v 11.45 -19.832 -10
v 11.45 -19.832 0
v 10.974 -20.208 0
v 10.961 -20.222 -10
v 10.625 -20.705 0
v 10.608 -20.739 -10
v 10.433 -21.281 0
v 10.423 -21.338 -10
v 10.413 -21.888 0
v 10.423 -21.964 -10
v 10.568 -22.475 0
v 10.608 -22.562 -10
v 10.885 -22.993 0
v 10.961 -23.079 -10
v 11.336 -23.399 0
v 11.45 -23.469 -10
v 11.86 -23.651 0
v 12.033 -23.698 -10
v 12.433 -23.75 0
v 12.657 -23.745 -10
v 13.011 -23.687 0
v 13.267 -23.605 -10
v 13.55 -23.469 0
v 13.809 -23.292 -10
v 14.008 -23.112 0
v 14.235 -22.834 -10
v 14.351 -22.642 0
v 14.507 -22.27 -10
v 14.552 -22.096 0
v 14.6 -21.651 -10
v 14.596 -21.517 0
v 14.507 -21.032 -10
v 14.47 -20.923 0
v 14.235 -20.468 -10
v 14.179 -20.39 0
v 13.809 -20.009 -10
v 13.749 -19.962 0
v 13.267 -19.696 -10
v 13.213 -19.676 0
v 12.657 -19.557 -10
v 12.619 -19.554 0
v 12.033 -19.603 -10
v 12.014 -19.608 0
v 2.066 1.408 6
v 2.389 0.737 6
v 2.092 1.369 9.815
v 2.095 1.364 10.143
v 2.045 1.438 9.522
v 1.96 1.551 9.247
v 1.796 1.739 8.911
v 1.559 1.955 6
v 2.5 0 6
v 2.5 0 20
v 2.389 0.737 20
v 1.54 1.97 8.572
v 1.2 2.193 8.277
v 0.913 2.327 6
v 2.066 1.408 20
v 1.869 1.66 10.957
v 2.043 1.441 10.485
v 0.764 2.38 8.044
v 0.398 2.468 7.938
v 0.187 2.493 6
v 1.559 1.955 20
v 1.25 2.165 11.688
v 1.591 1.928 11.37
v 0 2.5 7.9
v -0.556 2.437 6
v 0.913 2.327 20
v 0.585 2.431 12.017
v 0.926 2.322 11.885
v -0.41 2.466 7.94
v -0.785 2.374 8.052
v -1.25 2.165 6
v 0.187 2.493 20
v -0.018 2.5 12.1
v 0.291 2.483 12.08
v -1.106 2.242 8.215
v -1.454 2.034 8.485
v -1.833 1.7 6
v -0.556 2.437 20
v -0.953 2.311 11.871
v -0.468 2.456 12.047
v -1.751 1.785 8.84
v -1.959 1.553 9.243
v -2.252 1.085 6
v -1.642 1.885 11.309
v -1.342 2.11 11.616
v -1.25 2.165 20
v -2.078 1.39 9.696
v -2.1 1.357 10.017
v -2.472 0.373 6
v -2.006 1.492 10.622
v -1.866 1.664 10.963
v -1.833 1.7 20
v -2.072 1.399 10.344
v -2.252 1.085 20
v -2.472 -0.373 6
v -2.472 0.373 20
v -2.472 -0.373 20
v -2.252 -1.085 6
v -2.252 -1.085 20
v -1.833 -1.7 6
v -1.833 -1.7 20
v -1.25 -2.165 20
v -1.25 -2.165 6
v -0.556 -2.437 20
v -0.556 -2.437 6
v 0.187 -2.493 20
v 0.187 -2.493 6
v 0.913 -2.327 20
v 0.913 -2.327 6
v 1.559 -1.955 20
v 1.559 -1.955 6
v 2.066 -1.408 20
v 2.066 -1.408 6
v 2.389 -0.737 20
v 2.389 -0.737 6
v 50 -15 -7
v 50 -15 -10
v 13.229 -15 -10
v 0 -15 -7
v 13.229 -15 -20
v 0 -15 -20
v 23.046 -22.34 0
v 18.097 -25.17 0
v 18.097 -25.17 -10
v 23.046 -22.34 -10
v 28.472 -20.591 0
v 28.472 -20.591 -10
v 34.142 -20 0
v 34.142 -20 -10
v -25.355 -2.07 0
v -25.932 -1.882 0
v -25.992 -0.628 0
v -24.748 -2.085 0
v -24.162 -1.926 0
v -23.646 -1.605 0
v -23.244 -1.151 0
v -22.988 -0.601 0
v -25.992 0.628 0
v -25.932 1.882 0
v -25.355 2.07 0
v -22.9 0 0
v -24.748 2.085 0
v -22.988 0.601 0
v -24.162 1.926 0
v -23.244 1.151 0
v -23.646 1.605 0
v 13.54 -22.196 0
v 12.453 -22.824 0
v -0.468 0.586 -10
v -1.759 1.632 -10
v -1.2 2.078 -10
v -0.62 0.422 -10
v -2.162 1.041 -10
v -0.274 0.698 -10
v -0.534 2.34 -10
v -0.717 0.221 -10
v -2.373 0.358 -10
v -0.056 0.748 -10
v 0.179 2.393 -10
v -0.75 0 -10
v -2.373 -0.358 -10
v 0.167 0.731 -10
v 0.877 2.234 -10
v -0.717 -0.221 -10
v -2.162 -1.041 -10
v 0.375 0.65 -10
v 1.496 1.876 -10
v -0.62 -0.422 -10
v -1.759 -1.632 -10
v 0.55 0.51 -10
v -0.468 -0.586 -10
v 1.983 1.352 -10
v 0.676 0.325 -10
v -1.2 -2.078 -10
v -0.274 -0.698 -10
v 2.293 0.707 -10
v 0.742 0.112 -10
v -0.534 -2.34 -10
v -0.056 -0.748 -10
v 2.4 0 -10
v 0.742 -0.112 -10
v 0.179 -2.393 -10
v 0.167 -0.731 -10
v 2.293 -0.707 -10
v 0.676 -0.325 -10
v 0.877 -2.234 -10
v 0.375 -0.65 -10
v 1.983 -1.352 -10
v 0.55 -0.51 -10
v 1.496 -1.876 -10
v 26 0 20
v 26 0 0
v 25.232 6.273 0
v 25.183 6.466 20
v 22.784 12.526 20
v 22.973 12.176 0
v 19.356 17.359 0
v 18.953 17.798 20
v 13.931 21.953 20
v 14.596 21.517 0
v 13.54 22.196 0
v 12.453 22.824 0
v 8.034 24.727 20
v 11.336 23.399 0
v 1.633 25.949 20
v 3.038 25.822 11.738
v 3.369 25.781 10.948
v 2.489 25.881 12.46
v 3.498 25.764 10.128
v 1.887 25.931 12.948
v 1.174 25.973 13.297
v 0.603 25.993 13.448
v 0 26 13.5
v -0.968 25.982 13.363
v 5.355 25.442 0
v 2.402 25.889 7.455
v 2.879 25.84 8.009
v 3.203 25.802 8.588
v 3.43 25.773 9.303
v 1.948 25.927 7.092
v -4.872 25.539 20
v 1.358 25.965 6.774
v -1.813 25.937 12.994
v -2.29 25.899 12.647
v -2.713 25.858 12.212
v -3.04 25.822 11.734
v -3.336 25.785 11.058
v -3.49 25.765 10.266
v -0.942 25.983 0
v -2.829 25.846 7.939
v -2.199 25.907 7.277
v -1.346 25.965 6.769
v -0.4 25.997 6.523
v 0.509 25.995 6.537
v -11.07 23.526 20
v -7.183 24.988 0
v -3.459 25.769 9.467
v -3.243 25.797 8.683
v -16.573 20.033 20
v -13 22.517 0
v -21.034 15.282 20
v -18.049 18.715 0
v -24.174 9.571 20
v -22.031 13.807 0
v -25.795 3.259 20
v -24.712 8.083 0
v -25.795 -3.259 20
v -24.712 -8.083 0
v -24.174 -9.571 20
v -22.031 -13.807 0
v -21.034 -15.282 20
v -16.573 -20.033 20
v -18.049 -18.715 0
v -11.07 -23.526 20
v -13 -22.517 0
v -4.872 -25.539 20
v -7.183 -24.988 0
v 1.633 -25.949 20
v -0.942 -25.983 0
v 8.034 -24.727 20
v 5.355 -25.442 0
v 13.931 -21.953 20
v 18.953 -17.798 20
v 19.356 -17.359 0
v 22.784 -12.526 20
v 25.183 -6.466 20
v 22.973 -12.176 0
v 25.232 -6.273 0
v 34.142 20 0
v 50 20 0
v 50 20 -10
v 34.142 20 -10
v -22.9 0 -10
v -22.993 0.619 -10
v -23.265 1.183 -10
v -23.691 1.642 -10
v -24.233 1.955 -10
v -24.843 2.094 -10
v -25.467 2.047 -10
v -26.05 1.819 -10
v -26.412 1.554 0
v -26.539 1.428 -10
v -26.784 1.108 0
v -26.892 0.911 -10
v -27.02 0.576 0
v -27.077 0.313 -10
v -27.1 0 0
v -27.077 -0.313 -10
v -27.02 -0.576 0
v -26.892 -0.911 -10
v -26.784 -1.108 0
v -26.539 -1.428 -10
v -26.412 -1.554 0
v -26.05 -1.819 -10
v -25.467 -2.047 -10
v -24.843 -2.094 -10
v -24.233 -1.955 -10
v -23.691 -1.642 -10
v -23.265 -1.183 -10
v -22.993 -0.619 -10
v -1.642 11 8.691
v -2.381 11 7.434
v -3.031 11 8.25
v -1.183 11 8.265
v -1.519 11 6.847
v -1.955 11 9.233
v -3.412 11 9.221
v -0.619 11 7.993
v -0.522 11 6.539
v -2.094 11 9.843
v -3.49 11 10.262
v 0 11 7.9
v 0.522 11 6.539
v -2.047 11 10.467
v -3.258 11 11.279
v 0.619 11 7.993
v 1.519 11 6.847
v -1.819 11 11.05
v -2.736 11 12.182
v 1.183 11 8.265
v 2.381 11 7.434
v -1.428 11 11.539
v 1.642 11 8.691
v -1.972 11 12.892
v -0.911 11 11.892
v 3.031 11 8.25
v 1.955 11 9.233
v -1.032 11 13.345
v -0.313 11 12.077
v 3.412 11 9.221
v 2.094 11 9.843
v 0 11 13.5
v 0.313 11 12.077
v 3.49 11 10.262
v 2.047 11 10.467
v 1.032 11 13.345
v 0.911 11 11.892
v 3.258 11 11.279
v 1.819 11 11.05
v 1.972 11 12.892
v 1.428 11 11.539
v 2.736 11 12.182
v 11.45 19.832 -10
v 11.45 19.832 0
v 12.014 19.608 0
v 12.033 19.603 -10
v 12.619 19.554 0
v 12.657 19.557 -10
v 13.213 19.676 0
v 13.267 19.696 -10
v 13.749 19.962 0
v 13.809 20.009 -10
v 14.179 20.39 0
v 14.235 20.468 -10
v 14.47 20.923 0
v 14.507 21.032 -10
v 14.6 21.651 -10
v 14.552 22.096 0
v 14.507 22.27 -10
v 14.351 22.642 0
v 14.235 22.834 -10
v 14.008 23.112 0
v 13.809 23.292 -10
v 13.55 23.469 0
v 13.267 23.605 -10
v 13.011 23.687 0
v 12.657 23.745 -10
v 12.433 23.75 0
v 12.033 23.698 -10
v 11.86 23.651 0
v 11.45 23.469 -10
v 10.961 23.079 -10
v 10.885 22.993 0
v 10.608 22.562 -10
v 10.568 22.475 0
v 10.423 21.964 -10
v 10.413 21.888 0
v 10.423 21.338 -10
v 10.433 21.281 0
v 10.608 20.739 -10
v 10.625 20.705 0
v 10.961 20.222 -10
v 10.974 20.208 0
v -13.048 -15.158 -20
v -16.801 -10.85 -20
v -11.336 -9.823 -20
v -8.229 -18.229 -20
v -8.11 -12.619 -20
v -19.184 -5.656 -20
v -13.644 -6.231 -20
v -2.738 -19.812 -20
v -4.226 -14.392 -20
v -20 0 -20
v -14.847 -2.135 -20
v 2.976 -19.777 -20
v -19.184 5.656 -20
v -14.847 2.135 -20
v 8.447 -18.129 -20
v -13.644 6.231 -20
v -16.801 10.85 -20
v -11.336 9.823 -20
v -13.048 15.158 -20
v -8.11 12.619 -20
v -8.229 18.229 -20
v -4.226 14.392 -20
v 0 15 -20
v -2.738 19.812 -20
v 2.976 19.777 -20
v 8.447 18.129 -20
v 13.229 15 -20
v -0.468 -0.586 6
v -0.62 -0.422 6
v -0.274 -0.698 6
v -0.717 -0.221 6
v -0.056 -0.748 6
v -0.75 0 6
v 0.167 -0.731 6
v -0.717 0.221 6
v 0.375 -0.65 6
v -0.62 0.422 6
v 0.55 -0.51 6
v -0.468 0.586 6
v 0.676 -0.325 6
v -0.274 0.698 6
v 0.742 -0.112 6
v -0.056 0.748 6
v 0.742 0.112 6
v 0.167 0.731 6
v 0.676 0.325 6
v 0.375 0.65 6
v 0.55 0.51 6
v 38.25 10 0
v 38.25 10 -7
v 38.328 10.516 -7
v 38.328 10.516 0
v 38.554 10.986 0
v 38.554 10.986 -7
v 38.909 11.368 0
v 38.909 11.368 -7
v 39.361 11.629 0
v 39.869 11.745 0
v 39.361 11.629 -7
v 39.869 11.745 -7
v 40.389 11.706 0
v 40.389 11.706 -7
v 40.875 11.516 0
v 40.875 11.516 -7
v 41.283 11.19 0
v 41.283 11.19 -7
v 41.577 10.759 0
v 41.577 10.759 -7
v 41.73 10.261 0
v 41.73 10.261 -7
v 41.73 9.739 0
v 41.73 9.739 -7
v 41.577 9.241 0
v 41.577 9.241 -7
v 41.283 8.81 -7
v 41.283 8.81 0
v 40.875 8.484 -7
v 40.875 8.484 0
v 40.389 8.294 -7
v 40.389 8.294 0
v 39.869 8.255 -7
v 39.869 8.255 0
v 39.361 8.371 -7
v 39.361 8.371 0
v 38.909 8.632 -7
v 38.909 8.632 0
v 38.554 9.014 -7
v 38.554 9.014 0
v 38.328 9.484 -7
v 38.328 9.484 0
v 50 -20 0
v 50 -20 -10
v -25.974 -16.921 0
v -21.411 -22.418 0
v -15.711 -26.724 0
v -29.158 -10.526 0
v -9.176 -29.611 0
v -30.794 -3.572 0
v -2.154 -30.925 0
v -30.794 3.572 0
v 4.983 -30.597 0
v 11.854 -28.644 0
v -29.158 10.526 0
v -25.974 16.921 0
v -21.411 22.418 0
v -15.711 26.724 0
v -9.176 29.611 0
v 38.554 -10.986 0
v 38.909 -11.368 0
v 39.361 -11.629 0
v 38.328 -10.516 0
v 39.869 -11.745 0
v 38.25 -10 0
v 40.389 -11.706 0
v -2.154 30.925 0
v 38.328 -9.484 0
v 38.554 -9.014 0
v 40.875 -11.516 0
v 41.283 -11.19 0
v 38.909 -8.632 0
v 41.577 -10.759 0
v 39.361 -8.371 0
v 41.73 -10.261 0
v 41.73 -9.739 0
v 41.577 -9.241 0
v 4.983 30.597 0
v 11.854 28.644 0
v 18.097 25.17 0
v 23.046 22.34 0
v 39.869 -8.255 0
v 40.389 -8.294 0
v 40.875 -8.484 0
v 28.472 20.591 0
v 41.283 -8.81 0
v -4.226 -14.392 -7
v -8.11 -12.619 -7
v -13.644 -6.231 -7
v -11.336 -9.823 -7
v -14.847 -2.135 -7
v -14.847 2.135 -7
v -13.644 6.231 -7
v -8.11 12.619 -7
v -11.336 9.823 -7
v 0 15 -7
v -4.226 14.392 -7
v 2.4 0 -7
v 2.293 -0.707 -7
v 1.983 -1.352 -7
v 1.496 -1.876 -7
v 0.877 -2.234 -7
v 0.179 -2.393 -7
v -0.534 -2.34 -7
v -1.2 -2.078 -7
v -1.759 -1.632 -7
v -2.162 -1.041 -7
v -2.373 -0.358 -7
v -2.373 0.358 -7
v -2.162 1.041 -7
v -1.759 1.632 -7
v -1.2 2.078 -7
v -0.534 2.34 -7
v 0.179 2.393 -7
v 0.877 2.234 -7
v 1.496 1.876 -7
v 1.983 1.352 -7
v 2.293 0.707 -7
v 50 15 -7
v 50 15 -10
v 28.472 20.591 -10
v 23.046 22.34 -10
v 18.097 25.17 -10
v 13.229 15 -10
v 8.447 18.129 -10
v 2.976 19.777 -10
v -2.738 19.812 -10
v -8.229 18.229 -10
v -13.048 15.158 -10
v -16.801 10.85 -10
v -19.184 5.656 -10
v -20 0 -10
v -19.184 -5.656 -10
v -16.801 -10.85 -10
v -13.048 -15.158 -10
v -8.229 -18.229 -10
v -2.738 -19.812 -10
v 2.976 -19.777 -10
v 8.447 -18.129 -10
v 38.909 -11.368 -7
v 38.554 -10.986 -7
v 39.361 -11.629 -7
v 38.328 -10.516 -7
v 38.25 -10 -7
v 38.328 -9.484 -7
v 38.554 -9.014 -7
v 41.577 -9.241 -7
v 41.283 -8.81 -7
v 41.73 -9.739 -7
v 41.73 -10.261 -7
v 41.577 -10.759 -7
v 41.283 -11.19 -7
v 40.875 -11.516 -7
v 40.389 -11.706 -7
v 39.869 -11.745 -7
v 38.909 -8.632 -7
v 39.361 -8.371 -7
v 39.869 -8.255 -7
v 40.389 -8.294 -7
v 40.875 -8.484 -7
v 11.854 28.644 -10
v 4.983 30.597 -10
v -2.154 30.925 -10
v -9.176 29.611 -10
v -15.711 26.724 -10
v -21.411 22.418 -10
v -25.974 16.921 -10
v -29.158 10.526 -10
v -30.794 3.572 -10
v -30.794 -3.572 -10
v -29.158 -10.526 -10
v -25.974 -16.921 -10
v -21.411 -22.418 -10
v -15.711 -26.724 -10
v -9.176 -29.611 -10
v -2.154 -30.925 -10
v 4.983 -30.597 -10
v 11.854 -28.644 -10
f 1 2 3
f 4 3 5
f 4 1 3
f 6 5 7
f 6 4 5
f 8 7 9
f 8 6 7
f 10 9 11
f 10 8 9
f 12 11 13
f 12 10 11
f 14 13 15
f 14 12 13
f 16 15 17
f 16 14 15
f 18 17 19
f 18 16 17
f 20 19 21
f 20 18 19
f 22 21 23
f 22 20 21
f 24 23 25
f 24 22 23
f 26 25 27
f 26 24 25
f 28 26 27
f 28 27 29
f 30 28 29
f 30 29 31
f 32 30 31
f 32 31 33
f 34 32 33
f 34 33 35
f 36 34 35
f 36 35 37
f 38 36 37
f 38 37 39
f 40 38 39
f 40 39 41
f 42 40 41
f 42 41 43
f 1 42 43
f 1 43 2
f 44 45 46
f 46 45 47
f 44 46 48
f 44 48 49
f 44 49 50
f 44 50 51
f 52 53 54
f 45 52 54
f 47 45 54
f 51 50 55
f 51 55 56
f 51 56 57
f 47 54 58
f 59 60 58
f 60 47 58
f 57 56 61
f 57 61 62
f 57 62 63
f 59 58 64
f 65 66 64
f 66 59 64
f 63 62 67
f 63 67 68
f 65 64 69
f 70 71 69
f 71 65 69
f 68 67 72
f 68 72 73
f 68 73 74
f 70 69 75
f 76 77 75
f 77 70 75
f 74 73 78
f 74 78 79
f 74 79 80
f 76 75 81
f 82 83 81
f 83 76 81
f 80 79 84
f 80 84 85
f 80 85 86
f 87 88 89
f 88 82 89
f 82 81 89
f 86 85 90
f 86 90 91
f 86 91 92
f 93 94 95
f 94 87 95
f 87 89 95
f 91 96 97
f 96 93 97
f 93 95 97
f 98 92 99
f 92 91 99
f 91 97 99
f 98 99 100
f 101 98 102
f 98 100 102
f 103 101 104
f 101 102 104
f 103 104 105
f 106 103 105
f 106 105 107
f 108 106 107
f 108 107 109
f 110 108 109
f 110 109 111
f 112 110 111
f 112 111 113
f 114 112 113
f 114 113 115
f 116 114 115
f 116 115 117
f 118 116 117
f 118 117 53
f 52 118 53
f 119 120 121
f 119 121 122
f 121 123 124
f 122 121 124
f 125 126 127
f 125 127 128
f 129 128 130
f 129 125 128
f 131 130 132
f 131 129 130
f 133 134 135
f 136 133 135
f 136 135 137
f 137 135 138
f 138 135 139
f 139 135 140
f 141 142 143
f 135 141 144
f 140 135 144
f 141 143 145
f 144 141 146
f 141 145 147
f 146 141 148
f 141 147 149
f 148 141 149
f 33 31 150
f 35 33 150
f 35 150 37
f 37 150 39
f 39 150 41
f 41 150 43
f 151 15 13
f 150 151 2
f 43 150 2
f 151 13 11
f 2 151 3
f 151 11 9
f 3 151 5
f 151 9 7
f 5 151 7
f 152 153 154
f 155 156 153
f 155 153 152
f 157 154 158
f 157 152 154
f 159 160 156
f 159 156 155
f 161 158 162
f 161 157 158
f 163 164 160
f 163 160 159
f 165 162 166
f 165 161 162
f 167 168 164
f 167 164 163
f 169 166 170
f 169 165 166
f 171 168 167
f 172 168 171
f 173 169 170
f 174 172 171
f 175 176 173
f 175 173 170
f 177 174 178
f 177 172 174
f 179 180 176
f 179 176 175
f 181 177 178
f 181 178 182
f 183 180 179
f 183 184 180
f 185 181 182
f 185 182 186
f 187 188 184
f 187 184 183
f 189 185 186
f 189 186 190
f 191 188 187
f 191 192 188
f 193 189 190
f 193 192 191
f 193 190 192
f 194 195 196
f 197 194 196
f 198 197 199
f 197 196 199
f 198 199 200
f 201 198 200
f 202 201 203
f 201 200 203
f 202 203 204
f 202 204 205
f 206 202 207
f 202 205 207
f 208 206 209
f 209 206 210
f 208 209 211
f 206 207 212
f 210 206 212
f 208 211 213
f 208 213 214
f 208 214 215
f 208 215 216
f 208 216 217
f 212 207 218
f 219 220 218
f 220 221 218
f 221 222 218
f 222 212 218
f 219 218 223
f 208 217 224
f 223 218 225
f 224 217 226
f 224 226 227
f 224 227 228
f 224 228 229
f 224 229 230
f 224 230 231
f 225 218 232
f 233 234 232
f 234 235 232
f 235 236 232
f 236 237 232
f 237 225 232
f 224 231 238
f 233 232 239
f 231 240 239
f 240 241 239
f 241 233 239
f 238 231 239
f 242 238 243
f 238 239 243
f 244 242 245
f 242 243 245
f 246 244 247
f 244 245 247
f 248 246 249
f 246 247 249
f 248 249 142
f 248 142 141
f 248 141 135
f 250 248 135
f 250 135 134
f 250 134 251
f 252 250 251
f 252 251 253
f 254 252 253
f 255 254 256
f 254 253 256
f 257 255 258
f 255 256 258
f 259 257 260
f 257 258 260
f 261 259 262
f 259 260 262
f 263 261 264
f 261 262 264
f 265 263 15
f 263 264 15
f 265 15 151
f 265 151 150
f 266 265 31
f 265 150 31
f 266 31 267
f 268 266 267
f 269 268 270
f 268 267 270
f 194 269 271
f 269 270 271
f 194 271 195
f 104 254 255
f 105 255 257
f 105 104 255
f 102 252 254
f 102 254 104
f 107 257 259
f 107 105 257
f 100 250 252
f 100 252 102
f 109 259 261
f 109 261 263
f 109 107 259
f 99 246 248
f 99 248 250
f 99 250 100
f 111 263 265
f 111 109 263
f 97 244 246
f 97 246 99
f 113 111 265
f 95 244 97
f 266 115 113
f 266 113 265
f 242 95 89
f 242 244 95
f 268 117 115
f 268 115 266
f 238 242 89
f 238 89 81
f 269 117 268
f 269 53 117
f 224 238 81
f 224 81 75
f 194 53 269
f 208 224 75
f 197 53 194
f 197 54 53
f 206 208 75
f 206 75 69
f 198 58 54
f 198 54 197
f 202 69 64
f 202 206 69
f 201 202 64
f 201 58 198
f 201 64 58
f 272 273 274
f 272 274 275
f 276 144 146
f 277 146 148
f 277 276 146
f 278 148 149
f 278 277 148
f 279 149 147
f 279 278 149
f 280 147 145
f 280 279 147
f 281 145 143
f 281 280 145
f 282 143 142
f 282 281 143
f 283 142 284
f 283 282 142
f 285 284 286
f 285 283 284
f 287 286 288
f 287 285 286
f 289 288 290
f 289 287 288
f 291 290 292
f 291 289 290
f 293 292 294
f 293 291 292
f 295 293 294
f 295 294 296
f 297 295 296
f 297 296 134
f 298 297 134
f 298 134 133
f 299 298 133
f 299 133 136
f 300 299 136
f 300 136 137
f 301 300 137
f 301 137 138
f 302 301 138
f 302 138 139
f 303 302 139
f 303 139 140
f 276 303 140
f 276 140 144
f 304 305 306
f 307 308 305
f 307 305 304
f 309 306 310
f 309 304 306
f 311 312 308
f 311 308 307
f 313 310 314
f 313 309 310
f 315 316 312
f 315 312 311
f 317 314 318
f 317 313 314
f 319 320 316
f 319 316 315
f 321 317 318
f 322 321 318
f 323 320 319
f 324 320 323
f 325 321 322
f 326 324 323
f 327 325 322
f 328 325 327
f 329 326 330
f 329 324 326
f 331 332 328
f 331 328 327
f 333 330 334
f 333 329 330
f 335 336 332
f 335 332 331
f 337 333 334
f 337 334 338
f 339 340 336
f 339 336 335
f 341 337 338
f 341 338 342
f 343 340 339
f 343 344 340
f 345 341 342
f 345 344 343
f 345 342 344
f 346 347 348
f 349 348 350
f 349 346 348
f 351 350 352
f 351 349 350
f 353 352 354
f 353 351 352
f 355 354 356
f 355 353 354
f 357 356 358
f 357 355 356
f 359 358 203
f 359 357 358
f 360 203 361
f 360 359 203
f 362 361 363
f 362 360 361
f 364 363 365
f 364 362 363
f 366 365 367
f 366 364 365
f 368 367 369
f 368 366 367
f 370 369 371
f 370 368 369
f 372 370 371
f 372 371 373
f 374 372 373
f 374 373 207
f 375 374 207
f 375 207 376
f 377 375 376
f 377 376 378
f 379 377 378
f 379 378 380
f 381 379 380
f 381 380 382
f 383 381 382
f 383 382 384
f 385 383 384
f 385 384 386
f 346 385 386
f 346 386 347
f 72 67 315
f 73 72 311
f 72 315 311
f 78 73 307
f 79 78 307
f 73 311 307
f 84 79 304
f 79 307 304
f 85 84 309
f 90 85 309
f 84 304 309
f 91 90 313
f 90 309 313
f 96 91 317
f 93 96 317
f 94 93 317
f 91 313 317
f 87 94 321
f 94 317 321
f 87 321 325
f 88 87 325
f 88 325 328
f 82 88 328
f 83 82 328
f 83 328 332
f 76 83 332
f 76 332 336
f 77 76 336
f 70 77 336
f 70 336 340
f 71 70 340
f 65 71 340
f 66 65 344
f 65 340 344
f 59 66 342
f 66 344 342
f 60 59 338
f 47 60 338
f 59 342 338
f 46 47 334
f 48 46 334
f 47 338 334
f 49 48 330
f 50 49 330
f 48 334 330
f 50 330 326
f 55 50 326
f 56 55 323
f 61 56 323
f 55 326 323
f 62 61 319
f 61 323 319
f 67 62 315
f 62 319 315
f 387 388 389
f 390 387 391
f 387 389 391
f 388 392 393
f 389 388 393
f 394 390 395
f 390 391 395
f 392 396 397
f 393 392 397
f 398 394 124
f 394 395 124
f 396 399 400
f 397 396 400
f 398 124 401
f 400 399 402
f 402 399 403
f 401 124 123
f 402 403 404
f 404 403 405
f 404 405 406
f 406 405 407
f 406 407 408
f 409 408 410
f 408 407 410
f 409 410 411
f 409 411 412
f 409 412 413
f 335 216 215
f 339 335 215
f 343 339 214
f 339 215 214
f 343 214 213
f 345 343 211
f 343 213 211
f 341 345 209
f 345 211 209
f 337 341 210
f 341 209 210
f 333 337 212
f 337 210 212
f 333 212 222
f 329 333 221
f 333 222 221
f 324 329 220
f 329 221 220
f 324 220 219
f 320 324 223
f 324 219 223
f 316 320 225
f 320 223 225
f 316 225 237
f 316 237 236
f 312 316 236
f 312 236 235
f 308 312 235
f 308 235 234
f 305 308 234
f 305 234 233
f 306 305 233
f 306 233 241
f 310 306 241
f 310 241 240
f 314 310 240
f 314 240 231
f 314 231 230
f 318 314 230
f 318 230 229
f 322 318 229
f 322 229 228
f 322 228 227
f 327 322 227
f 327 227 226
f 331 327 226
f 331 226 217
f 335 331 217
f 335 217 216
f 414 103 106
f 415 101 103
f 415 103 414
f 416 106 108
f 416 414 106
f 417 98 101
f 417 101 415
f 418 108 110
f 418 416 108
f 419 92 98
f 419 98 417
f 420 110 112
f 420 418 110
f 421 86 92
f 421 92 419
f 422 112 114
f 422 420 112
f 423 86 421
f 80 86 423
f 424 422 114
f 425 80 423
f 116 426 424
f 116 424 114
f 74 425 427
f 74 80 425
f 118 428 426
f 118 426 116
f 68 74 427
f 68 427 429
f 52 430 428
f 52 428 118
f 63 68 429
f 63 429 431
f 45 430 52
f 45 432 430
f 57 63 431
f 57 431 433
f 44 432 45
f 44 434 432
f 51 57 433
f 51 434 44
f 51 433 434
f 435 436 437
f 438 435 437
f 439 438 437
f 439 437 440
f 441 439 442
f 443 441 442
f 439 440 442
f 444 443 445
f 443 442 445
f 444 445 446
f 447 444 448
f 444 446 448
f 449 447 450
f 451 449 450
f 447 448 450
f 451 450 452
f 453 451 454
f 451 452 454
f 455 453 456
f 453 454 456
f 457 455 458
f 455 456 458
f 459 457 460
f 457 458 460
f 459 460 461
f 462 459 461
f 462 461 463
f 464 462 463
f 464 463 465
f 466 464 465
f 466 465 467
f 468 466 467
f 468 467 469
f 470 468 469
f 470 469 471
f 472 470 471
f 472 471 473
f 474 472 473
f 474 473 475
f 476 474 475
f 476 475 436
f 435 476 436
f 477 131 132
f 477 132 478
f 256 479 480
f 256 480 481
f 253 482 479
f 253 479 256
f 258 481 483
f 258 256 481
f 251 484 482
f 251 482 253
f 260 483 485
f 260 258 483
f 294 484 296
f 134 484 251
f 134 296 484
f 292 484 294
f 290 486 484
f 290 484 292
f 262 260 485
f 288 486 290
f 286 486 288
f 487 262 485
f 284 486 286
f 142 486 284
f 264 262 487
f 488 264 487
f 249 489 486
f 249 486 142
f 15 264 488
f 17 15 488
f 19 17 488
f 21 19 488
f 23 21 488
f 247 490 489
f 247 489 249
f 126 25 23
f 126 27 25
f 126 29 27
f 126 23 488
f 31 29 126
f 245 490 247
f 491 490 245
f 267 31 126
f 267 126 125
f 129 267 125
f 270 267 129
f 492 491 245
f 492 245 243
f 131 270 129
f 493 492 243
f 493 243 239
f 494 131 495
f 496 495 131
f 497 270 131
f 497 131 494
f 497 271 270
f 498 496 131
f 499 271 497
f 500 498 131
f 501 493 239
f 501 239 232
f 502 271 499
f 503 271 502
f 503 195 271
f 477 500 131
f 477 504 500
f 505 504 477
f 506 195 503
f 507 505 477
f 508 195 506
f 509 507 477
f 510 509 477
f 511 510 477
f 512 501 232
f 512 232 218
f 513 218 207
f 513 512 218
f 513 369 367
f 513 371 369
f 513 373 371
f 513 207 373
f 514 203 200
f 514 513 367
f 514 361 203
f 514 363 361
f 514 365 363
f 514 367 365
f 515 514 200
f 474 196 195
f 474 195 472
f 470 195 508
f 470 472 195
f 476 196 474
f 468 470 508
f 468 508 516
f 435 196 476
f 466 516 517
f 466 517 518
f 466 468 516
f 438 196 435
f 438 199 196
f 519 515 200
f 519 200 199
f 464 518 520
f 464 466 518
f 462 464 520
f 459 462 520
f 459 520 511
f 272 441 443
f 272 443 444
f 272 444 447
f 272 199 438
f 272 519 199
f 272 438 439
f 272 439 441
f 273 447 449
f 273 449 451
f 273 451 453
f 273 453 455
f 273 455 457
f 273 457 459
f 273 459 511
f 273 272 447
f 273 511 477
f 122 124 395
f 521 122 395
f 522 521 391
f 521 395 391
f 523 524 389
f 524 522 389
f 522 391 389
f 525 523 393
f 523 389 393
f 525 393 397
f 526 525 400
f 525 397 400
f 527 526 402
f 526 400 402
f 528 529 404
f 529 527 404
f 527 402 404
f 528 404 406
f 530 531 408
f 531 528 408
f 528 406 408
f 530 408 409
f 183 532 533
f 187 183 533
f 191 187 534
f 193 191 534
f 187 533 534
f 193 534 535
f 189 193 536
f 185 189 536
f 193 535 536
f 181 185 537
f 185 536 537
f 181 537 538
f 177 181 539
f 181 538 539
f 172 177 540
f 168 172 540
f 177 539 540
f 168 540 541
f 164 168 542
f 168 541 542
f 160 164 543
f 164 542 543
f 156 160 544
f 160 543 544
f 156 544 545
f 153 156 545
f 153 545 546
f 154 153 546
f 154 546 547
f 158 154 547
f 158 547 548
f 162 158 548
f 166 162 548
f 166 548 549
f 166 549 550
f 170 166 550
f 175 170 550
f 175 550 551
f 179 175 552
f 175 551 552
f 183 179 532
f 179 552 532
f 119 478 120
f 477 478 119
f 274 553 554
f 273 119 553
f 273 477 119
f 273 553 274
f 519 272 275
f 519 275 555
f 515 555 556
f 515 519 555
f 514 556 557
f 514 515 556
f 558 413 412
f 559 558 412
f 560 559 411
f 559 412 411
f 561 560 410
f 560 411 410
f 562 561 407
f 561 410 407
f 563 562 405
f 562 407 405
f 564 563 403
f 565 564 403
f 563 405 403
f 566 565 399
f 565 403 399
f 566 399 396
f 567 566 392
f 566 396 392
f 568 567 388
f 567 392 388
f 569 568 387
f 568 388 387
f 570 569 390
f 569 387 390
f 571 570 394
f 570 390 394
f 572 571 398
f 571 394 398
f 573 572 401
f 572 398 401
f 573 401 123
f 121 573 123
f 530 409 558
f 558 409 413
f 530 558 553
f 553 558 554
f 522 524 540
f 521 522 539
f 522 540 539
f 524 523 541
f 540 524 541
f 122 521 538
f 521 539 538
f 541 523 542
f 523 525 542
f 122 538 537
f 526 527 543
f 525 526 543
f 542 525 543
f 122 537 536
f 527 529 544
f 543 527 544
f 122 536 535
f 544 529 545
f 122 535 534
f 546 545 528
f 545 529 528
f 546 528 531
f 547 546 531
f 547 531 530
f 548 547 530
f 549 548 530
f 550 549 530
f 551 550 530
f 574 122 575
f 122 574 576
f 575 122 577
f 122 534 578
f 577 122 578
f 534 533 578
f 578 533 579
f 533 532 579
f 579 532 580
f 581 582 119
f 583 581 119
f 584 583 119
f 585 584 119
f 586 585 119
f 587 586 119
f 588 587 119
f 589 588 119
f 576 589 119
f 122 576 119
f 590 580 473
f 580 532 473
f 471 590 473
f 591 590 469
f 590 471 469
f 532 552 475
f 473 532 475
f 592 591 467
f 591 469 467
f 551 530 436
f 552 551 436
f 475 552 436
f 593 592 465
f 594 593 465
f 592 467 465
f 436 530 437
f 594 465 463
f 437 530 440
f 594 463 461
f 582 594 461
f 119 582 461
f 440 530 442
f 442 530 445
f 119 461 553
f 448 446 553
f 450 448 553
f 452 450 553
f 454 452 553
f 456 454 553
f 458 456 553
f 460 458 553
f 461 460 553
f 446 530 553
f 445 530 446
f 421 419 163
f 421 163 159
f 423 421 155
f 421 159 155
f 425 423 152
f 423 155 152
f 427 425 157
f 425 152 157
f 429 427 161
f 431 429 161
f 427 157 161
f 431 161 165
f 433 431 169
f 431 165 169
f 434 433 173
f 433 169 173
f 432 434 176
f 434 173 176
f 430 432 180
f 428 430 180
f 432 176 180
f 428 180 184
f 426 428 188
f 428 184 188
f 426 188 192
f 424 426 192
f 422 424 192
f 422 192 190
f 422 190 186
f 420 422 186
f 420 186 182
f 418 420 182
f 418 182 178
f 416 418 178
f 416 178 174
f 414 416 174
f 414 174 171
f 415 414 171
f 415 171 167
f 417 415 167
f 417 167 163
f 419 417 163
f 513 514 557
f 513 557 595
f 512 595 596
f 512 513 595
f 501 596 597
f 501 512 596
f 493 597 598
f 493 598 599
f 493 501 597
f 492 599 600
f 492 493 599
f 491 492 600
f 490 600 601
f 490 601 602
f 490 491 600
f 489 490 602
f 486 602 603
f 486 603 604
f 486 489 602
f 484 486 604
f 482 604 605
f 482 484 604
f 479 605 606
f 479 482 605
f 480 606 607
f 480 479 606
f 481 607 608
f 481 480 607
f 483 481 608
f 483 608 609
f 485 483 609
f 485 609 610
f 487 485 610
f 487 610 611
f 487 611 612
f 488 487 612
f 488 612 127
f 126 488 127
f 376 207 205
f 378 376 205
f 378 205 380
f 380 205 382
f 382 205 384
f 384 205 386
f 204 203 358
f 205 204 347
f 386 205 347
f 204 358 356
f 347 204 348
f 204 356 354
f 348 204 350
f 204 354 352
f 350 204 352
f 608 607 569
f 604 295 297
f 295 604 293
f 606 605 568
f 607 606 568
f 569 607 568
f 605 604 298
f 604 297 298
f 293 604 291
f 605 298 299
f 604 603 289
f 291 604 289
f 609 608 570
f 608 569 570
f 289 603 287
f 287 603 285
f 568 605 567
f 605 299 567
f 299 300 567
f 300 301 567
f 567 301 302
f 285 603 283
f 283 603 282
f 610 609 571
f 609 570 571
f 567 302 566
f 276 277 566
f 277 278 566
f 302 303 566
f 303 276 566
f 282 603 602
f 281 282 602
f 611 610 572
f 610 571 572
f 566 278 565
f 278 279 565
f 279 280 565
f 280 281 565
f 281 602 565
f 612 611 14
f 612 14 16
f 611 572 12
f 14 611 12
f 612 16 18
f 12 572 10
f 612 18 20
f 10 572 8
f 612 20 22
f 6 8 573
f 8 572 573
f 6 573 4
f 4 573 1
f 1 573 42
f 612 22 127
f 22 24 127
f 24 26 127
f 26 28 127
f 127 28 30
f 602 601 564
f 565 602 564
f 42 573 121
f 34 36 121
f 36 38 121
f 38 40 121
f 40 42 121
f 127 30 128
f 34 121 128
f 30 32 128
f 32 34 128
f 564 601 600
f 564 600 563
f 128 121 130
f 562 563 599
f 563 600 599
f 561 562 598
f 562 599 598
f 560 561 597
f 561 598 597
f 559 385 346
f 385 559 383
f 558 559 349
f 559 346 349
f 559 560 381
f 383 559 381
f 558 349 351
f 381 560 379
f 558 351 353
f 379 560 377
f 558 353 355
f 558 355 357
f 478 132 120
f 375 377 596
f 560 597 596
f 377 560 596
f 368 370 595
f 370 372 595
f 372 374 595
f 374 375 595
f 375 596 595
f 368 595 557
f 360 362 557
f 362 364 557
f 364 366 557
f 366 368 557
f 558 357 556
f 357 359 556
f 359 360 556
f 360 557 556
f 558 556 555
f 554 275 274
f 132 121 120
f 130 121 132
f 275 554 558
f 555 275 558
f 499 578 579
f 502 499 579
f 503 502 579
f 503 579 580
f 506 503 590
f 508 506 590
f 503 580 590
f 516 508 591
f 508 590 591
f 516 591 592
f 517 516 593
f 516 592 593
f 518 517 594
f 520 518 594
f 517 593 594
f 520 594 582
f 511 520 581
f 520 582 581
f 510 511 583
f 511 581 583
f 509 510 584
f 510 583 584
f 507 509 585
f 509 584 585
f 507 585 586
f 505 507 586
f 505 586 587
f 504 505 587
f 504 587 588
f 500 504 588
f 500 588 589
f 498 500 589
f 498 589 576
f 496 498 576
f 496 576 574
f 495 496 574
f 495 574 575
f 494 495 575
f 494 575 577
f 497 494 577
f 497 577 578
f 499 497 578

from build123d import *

# Parameters (mm, degrees)
SKETCH1_R                     = 26
BOSS_EXTRUDE1_DEPTH           = 20
SKETCH2_W                     = 2.1
SKETCH2_H                     = 26
SKETCH4_R                     = 3.5
CUT_EXTRUDE1_DEPTH            = 15
BOSS_EXTRUDE2_DEPTH           = 10
CUT_EXTRUDE2_DEPTH            = 3
SKETCH7_R                     = 2.4
BOSS_EXTRUDE3_DEPTH           = 3
SKETCH8_R                     = 0.75
CUT_EXTRUDE3_DEPTH            = 67.03786797
SKETCH9_R                     = 2.5
CUT_EXTRUDE4_DEPTH            = 14
SKETCH10_R                    = 1.75
CUT_EXTRUDE5_DEPTH            = 16
BOSS_EXTRUDE4_START           = 10
BOSS_EXTRUDE4_DEPTH           = 10
M5X0_8_START                  = -10
M5X0_8_TAPPED_HOLE2_OUTLINE_R = 2.1
M5X0_8_TAPPED_HOLE2_DEPTH     = 10
CIRPATTERN1_COUNT             = 3


# Read off the part's stored shape, not the designer's step: M5x0.8 Tapped Hole2
with BuildPart() as part:
    # Sketch1 → Boss-Extrude1 (new body)
    with BuildSketch(Plane.XY):
        Circle(SKETCH1_R)
    extrude(amount=BOSS_EXTRUDE1_DEPTH)

    # Sketch2 → M5x0.8 Tapped Hole1 (revolve, cut)
    with BuildSketch(Plane(origin=(0, 0, 10), x_dir=(0, 0, -1), z_dir=(1, 0, 0))):
        with Locations((1.05, 13)):
            Rectangle(SKETCH2_W, SKETCH2_H)
    revolve(axis=Axis((0, -6.35, 10), (0, 1, 0)), mode=Mode.SUBTRACT)

    # Sketch4 → Cut-Extrude1 (cut)
    with BuildSketch(Plane(origin=(0, 26, 0), x_dir=(-1, 0, 0), z_dir=(0, 1, 0))):
        with Locations(Location((0, 10, 0), (0, 0, 90))):
            Circle(SKETCH4_R)
    extrude(amount=-CUT_EXTRUDE1_DEPTH, mode=Mode.SUBTRACT)

    # Sketch5 → Boss-Extrude2 (add)
    with BuildSketch(Plane(origin=(0, 0, 0), x_dir=(-1, 0, 0), z_dir=(0, 0, -1))):
        with BuildLine():
            Line((-34.142470626, -20), (-50, -20))
            Line((-50, -20), (-50, 20))
            Line((-50, 20), (-34.142470626, 20))
            ThreePointArc((-34.142470626, 20), (-25.713473942, 21.324307139), (-18.096692901, 25.16961871))
            ThreePointArc((-18.096692901, 25.16961871), (31, 0), (-18.096692901, -25.16961871))
            ThreePointArc((-18.096692901, -25.16961871), (-25.713473942, -21.324307139), (-34.142470626, -20))
        make_face()
    extrude(amount=BOSS_EXTRUDE2_DEPTH)

    # Sketch6 → Cut-Extrude2 (cut)
    with BuildSketch(Plane(origin=(0, 0, -10), x_dir=(-1, 0, 0), z_dir=(0, 0, -1))):
        with BuildLine():
            Line((0, -15), (-80, -15))
            ThreePointArc((-80, -15), (-95, 0), (-80, 15))
            Line((-80, 15), (0, 15))
            ThreePointArc((0, 15), (15, 0), (0, -15))
        make_face()
    extrude(amount=-CUT_EXTRUDE2_DEPTH, mode=Mode.SUBTRACT)

    # Sketch7 → Boss-Extrude3 (add)
    with BuildSketch(Plane(origin=(0, 0, -7), x_dir=(-1, 0, 0), z_dir=(0, 0, -1))):
        with Locations(Location((0, 0, 0), (0, 0, 180))):
            Circle(SKETCH7_R)
    extrude(amount=BOSS_EXTRUDE3_DEPTH)

    # Sketch8 → Cut-Extrude3 (cut, through all)
    with BuildSketch(Plane(origin=(0, 0, -10), x_dir=(-1, 0, 0), z_dir=(0, 0, -1))):
        Circle(SKETCH8_R)
    extrude(amount=-CUT_EXTRUDE3_DEPTH, mode=Mode.SUBTRACT)

    # Sketch9 → Cut-Extrude4 (cut)
    with BuildSketch(Plane.XY.offset(20)):
        Circle(SKETCH9_R)
    extrude(amount=-CUT_EXTRUDE4_DEPTH, mode=Mode.SUBTRACT)

    # Sketch10 → Cut-Extrude5 (cut)
    with BuildSketch(Plane(origin=(0, 0, -7), x_dir=(-1, 0, 0), z_dir=(0, 0, -1))):
        with Locations((-40, -10)):
            Circle(SKETCH10_R)
        with Locations((-40, 10)):
            Circle(SKETCH10_R)
    extrude(amount=-CUT_EXTRUDE5_DEPTH, mode=Mode.SUBTRACT)

    # Sketch11 → Boss-Extrude4 (add)
    with BuildSketch(Plane(origin=(0, 0, -10), x_dir=(-1, 0, 0), z_dir=(0, 0, -1)).offset(BOSS_EXTRUDE4_START)):
        with BuildLine():
            Line((0, 15), (-13.228756555, 15))
            ThreePointArc((-13.228756555, 15), (20, 0), (-13.228756555, -15))
            Line((-13.228756555, -15), (0, -15))
            ThreePointArc((0, -15), (15, 0), (0, 15))
        make_face()
    extrude(amount=-BOSS_EXTRUDE4_DEPTH)

    # M5x0.8 Tapped Hole2 outline → M5x0.8 Tapped Hole2 (cut)
    with BuildSketch(Plane.XY.offset(M5X0_8_START)):
        with Locations((-25, 0)):
            Circle(M5X0_8_TAPPED_HOLE2_OUTLINE_R)
    m5x0_8_tapped_hole2 = extrude(amount=M5X0_8_TAPPED_HOLE2_DEPTH, mode=Mode.SUBTRACT)

    # CirPattern1: M5x0.8 Tapped Hole2 ×3 about axis
    cirpattern1_axis = Axis((0, 0, 0), (0, 0, 1))
    for i in range(1, CIRPATTERN1_COUNT):
        add(m5x0_8_tapped_hole2.rotate(cirpattern1_axis, i * 360 / CIRPATTERN1_COUNT), mode=Mode.SUBTRACT)


solid = part.part
